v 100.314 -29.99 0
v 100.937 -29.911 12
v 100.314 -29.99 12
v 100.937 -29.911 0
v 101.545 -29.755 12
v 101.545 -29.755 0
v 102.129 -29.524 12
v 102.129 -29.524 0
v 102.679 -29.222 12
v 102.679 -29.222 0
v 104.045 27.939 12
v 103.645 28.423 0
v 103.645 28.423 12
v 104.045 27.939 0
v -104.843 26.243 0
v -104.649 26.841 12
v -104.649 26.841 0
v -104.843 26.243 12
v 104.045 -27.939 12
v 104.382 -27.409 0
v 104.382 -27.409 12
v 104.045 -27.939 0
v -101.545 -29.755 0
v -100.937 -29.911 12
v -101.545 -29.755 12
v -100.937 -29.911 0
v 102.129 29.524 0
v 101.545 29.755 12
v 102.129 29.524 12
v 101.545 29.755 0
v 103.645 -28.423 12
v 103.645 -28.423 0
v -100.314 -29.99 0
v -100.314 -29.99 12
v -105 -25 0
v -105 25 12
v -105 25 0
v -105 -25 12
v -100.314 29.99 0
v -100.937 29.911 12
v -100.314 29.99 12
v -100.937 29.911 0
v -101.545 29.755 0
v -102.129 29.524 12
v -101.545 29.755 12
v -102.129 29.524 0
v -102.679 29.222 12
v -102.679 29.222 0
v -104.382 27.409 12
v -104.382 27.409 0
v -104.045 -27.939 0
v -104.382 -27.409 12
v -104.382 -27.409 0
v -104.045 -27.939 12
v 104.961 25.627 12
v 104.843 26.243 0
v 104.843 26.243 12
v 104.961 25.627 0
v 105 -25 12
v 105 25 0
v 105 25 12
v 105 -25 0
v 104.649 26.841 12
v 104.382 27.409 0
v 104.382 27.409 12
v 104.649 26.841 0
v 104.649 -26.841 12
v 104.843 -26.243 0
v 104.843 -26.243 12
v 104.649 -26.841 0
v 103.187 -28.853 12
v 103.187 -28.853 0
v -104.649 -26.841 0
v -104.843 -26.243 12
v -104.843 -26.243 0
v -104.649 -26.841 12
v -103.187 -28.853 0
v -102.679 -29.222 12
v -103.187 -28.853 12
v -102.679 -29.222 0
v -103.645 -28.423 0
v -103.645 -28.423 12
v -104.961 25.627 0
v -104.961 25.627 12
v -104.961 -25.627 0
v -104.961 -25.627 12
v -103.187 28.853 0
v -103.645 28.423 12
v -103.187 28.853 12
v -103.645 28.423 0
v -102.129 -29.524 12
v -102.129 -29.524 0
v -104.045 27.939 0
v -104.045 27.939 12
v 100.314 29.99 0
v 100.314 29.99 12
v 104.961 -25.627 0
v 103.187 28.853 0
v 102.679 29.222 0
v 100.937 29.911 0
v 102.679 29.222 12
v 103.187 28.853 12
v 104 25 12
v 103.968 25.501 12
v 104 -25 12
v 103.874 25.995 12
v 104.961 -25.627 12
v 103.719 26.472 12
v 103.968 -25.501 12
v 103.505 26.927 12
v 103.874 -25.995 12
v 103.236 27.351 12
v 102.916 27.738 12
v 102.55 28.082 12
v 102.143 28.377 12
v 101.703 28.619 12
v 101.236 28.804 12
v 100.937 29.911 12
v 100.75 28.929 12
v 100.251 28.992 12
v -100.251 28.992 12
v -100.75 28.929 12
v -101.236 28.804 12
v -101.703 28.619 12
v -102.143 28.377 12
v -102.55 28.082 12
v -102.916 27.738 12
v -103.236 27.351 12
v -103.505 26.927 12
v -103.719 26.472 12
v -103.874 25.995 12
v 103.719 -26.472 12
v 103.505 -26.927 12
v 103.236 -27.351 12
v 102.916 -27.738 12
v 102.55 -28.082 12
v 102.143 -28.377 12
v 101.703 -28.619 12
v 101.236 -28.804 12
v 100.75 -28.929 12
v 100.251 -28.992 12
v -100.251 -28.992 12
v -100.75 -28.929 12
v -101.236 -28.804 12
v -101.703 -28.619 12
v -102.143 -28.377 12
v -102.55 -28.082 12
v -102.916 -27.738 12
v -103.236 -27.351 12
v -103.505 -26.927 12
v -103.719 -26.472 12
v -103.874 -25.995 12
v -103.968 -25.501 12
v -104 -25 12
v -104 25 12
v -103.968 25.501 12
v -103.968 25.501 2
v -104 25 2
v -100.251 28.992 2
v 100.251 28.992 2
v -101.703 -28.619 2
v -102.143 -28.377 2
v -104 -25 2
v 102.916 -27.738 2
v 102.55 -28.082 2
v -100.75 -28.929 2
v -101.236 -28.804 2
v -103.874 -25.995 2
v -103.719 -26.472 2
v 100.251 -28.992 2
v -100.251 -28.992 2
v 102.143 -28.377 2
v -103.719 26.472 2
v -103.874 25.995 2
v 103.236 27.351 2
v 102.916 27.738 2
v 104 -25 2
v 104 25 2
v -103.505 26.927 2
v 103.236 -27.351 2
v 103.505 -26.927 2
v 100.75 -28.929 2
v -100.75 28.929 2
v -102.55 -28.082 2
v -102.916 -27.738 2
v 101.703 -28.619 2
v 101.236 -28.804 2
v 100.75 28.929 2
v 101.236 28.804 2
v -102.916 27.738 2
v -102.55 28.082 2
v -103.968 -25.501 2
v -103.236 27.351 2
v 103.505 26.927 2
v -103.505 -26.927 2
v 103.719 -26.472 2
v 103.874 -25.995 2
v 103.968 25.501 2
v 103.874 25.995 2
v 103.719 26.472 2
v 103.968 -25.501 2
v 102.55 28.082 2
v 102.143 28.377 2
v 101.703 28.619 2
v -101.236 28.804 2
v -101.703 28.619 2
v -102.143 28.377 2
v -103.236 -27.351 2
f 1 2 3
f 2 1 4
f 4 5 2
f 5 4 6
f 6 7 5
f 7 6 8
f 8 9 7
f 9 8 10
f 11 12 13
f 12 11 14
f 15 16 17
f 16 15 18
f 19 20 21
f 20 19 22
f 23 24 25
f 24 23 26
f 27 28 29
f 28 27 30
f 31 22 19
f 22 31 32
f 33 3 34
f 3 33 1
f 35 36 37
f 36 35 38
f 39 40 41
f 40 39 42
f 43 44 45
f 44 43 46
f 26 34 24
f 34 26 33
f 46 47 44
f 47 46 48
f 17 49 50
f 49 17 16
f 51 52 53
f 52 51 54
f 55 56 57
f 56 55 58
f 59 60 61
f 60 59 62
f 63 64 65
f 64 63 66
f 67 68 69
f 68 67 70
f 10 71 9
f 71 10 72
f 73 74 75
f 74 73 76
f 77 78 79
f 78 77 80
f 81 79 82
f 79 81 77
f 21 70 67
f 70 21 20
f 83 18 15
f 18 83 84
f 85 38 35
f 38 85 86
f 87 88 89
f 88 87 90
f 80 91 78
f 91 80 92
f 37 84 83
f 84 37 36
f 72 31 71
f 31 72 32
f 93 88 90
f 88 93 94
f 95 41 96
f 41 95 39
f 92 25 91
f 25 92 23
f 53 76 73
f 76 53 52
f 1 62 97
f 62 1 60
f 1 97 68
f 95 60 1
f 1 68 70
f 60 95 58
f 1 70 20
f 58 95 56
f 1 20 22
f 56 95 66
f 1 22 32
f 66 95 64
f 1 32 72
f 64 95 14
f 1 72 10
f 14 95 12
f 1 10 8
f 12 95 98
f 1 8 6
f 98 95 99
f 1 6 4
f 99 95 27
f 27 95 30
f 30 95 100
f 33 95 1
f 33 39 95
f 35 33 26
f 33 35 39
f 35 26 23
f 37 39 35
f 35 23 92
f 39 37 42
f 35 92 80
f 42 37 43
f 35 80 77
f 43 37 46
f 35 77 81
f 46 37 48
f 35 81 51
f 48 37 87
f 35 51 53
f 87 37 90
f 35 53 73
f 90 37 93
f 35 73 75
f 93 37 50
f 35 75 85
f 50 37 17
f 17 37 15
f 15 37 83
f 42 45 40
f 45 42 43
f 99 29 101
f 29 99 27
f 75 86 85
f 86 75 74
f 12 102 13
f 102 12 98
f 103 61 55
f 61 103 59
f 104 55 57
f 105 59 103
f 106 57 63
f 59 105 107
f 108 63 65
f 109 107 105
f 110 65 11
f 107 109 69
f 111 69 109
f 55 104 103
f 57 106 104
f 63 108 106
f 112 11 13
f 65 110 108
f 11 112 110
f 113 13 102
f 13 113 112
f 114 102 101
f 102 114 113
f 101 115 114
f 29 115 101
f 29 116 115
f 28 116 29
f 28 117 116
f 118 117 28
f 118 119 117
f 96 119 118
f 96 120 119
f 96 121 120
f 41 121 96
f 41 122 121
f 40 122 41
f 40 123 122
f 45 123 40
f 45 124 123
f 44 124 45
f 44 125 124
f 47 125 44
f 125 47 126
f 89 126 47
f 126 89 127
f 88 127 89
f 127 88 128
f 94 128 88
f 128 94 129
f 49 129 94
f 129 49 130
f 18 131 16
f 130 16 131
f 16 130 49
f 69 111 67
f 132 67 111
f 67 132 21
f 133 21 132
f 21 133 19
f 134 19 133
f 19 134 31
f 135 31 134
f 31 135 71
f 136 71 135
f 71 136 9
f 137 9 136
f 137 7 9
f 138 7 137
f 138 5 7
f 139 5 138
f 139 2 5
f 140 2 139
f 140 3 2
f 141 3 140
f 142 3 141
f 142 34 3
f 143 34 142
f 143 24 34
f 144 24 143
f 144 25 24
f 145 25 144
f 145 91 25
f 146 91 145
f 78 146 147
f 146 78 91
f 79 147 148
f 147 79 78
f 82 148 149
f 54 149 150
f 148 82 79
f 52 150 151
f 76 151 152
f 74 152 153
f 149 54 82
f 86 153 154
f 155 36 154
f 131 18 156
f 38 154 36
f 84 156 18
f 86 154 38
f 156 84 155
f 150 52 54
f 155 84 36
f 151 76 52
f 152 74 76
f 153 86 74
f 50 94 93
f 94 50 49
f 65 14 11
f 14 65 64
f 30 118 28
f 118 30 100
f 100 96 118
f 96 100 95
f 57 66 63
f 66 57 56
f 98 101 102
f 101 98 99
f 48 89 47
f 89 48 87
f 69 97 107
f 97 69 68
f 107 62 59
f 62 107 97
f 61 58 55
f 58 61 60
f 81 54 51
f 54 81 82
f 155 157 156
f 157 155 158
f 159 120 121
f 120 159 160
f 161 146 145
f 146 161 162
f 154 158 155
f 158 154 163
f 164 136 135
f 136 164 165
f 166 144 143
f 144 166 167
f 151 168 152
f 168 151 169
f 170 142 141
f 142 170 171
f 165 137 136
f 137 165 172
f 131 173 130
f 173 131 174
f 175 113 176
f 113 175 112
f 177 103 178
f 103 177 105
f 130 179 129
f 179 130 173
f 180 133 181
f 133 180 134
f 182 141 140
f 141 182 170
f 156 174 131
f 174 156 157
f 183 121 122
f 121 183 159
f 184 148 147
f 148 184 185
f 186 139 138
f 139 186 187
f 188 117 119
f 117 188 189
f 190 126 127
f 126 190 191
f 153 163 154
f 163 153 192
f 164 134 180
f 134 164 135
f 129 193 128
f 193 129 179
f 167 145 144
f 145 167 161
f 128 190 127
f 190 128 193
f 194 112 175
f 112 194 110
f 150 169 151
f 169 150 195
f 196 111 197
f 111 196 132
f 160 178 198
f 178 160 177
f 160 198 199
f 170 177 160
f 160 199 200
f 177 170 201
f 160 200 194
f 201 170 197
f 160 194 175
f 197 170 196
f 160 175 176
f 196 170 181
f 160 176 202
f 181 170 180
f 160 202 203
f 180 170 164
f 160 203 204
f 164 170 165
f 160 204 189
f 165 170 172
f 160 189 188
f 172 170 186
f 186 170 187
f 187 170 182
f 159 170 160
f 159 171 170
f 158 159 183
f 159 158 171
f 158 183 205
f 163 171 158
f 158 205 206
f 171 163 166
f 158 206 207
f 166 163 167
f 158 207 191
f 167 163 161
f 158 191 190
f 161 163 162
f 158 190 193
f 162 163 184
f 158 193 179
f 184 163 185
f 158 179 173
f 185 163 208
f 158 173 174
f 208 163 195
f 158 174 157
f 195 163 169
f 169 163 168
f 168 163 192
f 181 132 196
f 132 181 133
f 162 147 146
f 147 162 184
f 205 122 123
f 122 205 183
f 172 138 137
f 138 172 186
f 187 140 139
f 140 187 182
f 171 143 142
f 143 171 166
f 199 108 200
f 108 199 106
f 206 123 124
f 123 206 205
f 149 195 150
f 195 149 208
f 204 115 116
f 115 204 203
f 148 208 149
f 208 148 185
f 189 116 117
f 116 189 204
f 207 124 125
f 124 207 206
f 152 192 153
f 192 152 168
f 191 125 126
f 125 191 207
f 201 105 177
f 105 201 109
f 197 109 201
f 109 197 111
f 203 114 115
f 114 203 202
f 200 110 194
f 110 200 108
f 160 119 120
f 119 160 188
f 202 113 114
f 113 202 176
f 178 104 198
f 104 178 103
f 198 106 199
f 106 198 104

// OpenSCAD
$fn = 50;


difference() {
	union() {
		hull() {
			translate(v = [-100.0000000000, 25.0000000000, 0]) {
				cylinder(h = 12, r = 5);
			}
			translate(v = [100.0000000000, 25.0000000000, 0]) {
				cylinder(h = 12, r = 5);
			}
			translate(v = [-100.0000000000, -25.0000000000, 0]) {
				cylinder(h = 12, r = 5);
			}
			translate(v = [100.0000000000, -25.0000000000, 0]) {
				cylinder(h = 12, r = 5);
			}
		}
	}
	union() {
		translate(v = [0, 0, 2]) {
			hull() {
				translate(v = [-100.0000000000, 25.0000000000, 0]) {
					cylinder(h = 10, r = 4);
				}
				translate(v = [100.0000000000, 25.0000000000, 0]) {
					cylinder(h = 10, r = 4);
				}
				translate(v = [-100.0000000000, -25.0000000000, 0]) {
					cylinder(h = 10, r = 4);
				}
				translate(v = [100.0000000000, -25.0000000000, 0]) {
					cylinder(h = 10, r = 4);
				}
			}
		}
	}
}
